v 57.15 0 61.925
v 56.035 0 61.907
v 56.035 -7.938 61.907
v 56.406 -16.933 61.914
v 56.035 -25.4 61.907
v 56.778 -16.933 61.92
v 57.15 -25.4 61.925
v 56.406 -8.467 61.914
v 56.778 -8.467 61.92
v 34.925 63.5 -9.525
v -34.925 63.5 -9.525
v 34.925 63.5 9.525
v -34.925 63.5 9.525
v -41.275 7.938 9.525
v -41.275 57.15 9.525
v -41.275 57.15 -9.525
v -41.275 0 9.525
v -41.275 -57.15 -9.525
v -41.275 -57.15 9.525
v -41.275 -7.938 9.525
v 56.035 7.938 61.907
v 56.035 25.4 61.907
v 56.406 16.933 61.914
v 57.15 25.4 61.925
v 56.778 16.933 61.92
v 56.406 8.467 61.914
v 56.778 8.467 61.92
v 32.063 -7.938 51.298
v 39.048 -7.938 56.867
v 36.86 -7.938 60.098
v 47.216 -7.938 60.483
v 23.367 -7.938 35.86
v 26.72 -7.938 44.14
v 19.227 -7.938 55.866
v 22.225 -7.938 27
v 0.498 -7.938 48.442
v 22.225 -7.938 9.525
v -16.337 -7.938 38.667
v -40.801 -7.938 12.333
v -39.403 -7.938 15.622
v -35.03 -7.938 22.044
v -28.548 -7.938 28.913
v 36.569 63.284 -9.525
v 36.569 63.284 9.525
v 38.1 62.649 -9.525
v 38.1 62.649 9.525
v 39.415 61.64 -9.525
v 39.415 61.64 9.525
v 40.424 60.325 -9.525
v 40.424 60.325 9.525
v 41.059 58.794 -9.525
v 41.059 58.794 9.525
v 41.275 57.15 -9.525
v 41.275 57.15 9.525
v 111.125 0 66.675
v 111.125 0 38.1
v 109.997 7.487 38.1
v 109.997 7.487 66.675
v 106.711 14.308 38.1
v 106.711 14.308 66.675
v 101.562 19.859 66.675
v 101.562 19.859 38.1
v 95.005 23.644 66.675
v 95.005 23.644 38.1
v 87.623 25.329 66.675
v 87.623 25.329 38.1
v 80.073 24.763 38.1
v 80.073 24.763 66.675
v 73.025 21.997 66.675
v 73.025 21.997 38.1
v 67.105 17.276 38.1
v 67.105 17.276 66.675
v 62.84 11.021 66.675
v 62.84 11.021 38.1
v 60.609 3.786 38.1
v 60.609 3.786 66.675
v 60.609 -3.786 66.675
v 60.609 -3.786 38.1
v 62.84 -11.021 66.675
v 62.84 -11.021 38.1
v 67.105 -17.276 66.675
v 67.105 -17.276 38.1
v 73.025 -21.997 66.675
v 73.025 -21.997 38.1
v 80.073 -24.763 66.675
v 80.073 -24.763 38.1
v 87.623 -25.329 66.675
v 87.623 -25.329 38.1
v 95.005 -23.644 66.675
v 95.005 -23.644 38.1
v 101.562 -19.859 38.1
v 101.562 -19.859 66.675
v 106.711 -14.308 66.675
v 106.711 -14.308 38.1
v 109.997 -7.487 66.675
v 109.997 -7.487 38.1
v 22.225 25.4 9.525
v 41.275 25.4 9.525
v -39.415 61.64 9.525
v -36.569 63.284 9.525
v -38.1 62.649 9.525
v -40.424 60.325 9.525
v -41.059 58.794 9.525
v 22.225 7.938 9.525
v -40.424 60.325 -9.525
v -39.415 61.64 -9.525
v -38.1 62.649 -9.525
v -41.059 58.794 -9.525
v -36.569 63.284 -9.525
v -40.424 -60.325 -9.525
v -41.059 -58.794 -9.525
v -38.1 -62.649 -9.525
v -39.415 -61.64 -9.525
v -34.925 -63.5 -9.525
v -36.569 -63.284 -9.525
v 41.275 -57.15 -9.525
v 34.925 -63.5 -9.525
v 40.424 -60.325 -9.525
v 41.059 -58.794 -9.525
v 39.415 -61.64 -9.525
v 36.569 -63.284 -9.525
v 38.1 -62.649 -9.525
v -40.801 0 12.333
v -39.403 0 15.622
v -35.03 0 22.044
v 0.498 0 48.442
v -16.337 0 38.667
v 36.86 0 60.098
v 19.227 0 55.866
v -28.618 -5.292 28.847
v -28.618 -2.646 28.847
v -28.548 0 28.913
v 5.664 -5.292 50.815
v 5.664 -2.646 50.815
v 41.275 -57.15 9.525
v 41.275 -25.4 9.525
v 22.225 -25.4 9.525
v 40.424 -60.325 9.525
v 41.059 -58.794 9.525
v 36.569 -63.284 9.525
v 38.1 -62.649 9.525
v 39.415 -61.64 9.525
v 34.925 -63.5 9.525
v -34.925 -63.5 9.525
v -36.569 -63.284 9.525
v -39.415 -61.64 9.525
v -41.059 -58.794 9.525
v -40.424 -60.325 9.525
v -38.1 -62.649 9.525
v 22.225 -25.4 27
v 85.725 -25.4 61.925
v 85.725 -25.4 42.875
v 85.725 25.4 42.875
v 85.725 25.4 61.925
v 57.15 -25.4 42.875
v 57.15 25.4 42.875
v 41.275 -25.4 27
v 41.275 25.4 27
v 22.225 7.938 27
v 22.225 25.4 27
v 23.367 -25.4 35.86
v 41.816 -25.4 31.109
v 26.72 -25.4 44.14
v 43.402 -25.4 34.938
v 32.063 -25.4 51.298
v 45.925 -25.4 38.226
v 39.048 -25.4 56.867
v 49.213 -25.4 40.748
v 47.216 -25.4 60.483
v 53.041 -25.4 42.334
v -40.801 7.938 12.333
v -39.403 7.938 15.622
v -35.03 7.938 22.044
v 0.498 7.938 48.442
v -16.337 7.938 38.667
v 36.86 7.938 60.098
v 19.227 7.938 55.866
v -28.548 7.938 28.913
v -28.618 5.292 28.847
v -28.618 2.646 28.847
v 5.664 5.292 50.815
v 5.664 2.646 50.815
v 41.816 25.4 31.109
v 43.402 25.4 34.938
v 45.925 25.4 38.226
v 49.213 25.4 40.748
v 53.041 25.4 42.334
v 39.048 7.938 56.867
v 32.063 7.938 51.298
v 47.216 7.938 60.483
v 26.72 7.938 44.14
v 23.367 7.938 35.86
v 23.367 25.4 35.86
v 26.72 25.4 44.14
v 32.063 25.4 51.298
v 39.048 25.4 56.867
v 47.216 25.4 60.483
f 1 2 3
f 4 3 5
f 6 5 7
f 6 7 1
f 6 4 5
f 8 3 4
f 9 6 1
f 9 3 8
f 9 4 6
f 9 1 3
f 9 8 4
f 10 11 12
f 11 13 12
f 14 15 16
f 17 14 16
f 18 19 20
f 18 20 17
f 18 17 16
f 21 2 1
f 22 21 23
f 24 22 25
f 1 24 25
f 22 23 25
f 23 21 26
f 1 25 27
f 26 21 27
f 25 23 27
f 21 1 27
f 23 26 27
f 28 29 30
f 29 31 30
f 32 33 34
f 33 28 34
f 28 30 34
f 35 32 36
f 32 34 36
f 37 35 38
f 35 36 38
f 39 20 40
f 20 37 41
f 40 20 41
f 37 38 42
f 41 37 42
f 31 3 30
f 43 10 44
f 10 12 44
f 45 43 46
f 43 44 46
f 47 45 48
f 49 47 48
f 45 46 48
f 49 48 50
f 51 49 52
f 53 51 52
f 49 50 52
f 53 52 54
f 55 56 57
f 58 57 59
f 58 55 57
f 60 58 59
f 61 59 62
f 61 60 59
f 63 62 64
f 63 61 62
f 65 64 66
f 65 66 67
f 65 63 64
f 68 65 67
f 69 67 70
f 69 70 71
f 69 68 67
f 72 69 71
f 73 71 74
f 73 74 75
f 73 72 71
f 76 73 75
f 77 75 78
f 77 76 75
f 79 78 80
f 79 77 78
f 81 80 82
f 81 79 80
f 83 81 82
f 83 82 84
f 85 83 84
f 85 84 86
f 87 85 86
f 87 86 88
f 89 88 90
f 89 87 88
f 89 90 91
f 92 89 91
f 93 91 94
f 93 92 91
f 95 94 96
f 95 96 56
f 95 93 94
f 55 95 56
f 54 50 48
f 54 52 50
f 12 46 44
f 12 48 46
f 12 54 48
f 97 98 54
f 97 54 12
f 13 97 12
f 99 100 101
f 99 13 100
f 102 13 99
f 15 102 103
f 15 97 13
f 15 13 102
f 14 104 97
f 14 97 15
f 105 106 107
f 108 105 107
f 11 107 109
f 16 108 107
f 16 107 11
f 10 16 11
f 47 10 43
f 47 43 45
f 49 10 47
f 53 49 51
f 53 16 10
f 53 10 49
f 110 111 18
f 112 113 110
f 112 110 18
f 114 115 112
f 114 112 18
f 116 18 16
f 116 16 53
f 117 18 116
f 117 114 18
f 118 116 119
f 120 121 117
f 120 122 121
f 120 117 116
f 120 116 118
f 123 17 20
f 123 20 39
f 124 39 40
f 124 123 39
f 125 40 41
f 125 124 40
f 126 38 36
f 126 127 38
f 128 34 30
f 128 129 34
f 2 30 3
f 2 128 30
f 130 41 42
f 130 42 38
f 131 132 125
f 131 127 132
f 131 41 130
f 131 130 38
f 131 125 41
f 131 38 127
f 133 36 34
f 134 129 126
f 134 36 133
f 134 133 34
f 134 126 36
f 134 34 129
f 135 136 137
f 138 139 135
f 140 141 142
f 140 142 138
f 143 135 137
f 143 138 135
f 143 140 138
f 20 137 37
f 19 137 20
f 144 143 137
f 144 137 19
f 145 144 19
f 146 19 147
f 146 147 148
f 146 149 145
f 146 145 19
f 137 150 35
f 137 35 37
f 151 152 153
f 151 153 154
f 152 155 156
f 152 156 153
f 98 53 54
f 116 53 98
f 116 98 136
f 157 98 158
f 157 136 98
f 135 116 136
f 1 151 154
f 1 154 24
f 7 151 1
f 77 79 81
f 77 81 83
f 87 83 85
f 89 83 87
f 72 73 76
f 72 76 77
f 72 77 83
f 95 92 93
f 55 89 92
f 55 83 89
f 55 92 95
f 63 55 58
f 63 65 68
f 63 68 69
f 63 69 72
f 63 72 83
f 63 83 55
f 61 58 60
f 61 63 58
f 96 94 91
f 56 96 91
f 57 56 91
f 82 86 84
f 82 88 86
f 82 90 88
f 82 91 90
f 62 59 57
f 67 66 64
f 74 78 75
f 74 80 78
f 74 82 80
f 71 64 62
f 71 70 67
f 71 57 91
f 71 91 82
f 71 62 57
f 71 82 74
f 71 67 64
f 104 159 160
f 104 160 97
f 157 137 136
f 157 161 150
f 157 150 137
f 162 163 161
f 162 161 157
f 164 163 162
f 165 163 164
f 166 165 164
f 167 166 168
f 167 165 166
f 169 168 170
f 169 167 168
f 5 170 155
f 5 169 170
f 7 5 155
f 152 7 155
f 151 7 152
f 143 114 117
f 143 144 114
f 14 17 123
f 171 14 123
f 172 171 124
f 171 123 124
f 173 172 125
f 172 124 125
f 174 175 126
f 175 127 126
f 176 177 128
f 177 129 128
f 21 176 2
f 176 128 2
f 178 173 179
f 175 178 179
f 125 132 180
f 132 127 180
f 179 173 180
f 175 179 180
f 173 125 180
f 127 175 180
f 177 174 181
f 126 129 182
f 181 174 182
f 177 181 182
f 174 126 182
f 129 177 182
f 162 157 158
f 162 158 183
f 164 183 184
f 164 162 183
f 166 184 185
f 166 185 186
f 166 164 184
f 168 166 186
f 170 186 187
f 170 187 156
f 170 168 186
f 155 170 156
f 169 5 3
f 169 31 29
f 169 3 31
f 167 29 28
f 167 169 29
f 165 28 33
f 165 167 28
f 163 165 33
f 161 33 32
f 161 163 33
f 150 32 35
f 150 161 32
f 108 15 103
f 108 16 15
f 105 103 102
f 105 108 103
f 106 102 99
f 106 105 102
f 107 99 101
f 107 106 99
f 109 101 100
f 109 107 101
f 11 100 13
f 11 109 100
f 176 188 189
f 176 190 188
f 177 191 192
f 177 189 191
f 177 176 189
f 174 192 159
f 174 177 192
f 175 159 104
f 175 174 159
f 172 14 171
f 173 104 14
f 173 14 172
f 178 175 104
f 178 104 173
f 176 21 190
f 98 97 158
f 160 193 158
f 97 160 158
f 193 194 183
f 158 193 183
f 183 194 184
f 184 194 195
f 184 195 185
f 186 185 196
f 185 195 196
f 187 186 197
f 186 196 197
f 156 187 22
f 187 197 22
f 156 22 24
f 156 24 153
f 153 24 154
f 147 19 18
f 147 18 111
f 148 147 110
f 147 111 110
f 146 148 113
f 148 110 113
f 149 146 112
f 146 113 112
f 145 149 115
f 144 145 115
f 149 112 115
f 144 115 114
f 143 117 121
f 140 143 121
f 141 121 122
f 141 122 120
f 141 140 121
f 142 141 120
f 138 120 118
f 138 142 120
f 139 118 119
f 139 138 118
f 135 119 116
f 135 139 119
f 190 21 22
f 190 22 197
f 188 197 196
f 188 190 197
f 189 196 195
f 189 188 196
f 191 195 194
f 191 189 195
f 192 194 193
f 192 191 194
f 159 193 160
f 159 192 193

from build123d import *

# Parameters (mm, degrees)
F1_DEPTH = 63.5
F0_W     = 25.4
F0_H     = 19.05
F2_DEPTH = 25.4
F3_DEPTH = 7.9375
F5_R     = 6.35


with BuildPart() as f1:
    # F0 (on Front) → F1 (new body, symmetric)
    with BuildSketch(Plane.XZ):
        Polygon((-41.275, -9.525), (41.275, -9.525), (41.275, 9.525), (22.225, 9.525), (-41.275, 9.525), align=None)
    extrude(amount=F1_DEPTH, both=True)

    # F0 (on Front) → F2 (join, symmetric)
    with BuildSketch(Plane.XZ):
        with BuildLine():
            Line((22.225, 9.525), (41.275, 9.525))
            Line((41.275, 9.525), (41.275, 27.0002))
            ThreePointArc((41.275, 27.0002), (45.9246798487, 38.2255201513), (57.15, 42.8752))
            Line((57.15, 42.8752), (60.325, 42.8752))
            Line((60.325, 42.8752), (60.325, 61.9252))
            Line((60.325, 61.9252), (57.15, 61.9252))
            add(Edge.make_bspline(
                [(56.0347498693, 61.9073889751), (56.4058210674, 61.9149064167), (56.7775734541, 61.9208491497), (57.15, 61.9252)],
                knots=[110.777900131, 110.777900131, 110.777900131, 110.777900131, 111.5045361635, 111.5045361635, 111.5045361635, 111.5045361635], degree=3))
            ThreePointArc((56.0347498693, 61.9073889751), (32.063093696, 51.2984048121), (22.225, 27.0002))
            Line((22.225, 27.0002), (22.225, 9.525))
        make_face()
        with Locations((73.025, 52.4002)):
            Rectangle(F0_W, F0_H)
    extrude(amount=F2_DEPTH, both=True)

    # F0 (on Front) → F3 (join, symmetric)
    with BuildSketch(Plane.XZ):
        with BuildLine():
            add(Edge.make_bspline(
                [(-41.275, 9.525), (-41.275, 23.015992373), (-0.5361966411, 60.7613318692), (56.0347498693, 61.9073889751)],
                knots=[0, 0, 0, 0, 110.777900131, 110.777900131, 110.777900131, 110.777900131], degree=3))
            Line((-41.275, 9.525), (22.225, 9.525))
            Line((22.225, 9.525), (22.225, 27.0002))
            ThreePointArc((22.225, 27.0002), (32.063093696, 51.2984048121), (56.0347498693, 61.9073889751))
        make_face()
    extrude(amount=F3_DEPTH, both=True)

    # F5
    f5_edges = [f1.edges().sort_by_distance(p)[0] for p in [
        (41.275, -63.5, 0),
        (41.275, 63.5, 0),
        (-41.275, -63.5, 0),
        (-41.275, 63.5, 0),
    ]]
    fillet(f5_edges, radius=F5_R)


with BuildPart() as f4:
    # F0 (on Front) → F4 (revolve)
    with BuildSketch(Plane.XZ):
        Polygon((85.725, 61.9252), (85.725, 42.8752), (85.725, 38.1), (111.125, 38.1), (111.125, 66.675), (85.725, 66.675), align=None)
    revolve(axis=Axis((85.725, 0, 52.3875), (0, 0, 1)))


solid = Compound([f1.part, f4.part])
